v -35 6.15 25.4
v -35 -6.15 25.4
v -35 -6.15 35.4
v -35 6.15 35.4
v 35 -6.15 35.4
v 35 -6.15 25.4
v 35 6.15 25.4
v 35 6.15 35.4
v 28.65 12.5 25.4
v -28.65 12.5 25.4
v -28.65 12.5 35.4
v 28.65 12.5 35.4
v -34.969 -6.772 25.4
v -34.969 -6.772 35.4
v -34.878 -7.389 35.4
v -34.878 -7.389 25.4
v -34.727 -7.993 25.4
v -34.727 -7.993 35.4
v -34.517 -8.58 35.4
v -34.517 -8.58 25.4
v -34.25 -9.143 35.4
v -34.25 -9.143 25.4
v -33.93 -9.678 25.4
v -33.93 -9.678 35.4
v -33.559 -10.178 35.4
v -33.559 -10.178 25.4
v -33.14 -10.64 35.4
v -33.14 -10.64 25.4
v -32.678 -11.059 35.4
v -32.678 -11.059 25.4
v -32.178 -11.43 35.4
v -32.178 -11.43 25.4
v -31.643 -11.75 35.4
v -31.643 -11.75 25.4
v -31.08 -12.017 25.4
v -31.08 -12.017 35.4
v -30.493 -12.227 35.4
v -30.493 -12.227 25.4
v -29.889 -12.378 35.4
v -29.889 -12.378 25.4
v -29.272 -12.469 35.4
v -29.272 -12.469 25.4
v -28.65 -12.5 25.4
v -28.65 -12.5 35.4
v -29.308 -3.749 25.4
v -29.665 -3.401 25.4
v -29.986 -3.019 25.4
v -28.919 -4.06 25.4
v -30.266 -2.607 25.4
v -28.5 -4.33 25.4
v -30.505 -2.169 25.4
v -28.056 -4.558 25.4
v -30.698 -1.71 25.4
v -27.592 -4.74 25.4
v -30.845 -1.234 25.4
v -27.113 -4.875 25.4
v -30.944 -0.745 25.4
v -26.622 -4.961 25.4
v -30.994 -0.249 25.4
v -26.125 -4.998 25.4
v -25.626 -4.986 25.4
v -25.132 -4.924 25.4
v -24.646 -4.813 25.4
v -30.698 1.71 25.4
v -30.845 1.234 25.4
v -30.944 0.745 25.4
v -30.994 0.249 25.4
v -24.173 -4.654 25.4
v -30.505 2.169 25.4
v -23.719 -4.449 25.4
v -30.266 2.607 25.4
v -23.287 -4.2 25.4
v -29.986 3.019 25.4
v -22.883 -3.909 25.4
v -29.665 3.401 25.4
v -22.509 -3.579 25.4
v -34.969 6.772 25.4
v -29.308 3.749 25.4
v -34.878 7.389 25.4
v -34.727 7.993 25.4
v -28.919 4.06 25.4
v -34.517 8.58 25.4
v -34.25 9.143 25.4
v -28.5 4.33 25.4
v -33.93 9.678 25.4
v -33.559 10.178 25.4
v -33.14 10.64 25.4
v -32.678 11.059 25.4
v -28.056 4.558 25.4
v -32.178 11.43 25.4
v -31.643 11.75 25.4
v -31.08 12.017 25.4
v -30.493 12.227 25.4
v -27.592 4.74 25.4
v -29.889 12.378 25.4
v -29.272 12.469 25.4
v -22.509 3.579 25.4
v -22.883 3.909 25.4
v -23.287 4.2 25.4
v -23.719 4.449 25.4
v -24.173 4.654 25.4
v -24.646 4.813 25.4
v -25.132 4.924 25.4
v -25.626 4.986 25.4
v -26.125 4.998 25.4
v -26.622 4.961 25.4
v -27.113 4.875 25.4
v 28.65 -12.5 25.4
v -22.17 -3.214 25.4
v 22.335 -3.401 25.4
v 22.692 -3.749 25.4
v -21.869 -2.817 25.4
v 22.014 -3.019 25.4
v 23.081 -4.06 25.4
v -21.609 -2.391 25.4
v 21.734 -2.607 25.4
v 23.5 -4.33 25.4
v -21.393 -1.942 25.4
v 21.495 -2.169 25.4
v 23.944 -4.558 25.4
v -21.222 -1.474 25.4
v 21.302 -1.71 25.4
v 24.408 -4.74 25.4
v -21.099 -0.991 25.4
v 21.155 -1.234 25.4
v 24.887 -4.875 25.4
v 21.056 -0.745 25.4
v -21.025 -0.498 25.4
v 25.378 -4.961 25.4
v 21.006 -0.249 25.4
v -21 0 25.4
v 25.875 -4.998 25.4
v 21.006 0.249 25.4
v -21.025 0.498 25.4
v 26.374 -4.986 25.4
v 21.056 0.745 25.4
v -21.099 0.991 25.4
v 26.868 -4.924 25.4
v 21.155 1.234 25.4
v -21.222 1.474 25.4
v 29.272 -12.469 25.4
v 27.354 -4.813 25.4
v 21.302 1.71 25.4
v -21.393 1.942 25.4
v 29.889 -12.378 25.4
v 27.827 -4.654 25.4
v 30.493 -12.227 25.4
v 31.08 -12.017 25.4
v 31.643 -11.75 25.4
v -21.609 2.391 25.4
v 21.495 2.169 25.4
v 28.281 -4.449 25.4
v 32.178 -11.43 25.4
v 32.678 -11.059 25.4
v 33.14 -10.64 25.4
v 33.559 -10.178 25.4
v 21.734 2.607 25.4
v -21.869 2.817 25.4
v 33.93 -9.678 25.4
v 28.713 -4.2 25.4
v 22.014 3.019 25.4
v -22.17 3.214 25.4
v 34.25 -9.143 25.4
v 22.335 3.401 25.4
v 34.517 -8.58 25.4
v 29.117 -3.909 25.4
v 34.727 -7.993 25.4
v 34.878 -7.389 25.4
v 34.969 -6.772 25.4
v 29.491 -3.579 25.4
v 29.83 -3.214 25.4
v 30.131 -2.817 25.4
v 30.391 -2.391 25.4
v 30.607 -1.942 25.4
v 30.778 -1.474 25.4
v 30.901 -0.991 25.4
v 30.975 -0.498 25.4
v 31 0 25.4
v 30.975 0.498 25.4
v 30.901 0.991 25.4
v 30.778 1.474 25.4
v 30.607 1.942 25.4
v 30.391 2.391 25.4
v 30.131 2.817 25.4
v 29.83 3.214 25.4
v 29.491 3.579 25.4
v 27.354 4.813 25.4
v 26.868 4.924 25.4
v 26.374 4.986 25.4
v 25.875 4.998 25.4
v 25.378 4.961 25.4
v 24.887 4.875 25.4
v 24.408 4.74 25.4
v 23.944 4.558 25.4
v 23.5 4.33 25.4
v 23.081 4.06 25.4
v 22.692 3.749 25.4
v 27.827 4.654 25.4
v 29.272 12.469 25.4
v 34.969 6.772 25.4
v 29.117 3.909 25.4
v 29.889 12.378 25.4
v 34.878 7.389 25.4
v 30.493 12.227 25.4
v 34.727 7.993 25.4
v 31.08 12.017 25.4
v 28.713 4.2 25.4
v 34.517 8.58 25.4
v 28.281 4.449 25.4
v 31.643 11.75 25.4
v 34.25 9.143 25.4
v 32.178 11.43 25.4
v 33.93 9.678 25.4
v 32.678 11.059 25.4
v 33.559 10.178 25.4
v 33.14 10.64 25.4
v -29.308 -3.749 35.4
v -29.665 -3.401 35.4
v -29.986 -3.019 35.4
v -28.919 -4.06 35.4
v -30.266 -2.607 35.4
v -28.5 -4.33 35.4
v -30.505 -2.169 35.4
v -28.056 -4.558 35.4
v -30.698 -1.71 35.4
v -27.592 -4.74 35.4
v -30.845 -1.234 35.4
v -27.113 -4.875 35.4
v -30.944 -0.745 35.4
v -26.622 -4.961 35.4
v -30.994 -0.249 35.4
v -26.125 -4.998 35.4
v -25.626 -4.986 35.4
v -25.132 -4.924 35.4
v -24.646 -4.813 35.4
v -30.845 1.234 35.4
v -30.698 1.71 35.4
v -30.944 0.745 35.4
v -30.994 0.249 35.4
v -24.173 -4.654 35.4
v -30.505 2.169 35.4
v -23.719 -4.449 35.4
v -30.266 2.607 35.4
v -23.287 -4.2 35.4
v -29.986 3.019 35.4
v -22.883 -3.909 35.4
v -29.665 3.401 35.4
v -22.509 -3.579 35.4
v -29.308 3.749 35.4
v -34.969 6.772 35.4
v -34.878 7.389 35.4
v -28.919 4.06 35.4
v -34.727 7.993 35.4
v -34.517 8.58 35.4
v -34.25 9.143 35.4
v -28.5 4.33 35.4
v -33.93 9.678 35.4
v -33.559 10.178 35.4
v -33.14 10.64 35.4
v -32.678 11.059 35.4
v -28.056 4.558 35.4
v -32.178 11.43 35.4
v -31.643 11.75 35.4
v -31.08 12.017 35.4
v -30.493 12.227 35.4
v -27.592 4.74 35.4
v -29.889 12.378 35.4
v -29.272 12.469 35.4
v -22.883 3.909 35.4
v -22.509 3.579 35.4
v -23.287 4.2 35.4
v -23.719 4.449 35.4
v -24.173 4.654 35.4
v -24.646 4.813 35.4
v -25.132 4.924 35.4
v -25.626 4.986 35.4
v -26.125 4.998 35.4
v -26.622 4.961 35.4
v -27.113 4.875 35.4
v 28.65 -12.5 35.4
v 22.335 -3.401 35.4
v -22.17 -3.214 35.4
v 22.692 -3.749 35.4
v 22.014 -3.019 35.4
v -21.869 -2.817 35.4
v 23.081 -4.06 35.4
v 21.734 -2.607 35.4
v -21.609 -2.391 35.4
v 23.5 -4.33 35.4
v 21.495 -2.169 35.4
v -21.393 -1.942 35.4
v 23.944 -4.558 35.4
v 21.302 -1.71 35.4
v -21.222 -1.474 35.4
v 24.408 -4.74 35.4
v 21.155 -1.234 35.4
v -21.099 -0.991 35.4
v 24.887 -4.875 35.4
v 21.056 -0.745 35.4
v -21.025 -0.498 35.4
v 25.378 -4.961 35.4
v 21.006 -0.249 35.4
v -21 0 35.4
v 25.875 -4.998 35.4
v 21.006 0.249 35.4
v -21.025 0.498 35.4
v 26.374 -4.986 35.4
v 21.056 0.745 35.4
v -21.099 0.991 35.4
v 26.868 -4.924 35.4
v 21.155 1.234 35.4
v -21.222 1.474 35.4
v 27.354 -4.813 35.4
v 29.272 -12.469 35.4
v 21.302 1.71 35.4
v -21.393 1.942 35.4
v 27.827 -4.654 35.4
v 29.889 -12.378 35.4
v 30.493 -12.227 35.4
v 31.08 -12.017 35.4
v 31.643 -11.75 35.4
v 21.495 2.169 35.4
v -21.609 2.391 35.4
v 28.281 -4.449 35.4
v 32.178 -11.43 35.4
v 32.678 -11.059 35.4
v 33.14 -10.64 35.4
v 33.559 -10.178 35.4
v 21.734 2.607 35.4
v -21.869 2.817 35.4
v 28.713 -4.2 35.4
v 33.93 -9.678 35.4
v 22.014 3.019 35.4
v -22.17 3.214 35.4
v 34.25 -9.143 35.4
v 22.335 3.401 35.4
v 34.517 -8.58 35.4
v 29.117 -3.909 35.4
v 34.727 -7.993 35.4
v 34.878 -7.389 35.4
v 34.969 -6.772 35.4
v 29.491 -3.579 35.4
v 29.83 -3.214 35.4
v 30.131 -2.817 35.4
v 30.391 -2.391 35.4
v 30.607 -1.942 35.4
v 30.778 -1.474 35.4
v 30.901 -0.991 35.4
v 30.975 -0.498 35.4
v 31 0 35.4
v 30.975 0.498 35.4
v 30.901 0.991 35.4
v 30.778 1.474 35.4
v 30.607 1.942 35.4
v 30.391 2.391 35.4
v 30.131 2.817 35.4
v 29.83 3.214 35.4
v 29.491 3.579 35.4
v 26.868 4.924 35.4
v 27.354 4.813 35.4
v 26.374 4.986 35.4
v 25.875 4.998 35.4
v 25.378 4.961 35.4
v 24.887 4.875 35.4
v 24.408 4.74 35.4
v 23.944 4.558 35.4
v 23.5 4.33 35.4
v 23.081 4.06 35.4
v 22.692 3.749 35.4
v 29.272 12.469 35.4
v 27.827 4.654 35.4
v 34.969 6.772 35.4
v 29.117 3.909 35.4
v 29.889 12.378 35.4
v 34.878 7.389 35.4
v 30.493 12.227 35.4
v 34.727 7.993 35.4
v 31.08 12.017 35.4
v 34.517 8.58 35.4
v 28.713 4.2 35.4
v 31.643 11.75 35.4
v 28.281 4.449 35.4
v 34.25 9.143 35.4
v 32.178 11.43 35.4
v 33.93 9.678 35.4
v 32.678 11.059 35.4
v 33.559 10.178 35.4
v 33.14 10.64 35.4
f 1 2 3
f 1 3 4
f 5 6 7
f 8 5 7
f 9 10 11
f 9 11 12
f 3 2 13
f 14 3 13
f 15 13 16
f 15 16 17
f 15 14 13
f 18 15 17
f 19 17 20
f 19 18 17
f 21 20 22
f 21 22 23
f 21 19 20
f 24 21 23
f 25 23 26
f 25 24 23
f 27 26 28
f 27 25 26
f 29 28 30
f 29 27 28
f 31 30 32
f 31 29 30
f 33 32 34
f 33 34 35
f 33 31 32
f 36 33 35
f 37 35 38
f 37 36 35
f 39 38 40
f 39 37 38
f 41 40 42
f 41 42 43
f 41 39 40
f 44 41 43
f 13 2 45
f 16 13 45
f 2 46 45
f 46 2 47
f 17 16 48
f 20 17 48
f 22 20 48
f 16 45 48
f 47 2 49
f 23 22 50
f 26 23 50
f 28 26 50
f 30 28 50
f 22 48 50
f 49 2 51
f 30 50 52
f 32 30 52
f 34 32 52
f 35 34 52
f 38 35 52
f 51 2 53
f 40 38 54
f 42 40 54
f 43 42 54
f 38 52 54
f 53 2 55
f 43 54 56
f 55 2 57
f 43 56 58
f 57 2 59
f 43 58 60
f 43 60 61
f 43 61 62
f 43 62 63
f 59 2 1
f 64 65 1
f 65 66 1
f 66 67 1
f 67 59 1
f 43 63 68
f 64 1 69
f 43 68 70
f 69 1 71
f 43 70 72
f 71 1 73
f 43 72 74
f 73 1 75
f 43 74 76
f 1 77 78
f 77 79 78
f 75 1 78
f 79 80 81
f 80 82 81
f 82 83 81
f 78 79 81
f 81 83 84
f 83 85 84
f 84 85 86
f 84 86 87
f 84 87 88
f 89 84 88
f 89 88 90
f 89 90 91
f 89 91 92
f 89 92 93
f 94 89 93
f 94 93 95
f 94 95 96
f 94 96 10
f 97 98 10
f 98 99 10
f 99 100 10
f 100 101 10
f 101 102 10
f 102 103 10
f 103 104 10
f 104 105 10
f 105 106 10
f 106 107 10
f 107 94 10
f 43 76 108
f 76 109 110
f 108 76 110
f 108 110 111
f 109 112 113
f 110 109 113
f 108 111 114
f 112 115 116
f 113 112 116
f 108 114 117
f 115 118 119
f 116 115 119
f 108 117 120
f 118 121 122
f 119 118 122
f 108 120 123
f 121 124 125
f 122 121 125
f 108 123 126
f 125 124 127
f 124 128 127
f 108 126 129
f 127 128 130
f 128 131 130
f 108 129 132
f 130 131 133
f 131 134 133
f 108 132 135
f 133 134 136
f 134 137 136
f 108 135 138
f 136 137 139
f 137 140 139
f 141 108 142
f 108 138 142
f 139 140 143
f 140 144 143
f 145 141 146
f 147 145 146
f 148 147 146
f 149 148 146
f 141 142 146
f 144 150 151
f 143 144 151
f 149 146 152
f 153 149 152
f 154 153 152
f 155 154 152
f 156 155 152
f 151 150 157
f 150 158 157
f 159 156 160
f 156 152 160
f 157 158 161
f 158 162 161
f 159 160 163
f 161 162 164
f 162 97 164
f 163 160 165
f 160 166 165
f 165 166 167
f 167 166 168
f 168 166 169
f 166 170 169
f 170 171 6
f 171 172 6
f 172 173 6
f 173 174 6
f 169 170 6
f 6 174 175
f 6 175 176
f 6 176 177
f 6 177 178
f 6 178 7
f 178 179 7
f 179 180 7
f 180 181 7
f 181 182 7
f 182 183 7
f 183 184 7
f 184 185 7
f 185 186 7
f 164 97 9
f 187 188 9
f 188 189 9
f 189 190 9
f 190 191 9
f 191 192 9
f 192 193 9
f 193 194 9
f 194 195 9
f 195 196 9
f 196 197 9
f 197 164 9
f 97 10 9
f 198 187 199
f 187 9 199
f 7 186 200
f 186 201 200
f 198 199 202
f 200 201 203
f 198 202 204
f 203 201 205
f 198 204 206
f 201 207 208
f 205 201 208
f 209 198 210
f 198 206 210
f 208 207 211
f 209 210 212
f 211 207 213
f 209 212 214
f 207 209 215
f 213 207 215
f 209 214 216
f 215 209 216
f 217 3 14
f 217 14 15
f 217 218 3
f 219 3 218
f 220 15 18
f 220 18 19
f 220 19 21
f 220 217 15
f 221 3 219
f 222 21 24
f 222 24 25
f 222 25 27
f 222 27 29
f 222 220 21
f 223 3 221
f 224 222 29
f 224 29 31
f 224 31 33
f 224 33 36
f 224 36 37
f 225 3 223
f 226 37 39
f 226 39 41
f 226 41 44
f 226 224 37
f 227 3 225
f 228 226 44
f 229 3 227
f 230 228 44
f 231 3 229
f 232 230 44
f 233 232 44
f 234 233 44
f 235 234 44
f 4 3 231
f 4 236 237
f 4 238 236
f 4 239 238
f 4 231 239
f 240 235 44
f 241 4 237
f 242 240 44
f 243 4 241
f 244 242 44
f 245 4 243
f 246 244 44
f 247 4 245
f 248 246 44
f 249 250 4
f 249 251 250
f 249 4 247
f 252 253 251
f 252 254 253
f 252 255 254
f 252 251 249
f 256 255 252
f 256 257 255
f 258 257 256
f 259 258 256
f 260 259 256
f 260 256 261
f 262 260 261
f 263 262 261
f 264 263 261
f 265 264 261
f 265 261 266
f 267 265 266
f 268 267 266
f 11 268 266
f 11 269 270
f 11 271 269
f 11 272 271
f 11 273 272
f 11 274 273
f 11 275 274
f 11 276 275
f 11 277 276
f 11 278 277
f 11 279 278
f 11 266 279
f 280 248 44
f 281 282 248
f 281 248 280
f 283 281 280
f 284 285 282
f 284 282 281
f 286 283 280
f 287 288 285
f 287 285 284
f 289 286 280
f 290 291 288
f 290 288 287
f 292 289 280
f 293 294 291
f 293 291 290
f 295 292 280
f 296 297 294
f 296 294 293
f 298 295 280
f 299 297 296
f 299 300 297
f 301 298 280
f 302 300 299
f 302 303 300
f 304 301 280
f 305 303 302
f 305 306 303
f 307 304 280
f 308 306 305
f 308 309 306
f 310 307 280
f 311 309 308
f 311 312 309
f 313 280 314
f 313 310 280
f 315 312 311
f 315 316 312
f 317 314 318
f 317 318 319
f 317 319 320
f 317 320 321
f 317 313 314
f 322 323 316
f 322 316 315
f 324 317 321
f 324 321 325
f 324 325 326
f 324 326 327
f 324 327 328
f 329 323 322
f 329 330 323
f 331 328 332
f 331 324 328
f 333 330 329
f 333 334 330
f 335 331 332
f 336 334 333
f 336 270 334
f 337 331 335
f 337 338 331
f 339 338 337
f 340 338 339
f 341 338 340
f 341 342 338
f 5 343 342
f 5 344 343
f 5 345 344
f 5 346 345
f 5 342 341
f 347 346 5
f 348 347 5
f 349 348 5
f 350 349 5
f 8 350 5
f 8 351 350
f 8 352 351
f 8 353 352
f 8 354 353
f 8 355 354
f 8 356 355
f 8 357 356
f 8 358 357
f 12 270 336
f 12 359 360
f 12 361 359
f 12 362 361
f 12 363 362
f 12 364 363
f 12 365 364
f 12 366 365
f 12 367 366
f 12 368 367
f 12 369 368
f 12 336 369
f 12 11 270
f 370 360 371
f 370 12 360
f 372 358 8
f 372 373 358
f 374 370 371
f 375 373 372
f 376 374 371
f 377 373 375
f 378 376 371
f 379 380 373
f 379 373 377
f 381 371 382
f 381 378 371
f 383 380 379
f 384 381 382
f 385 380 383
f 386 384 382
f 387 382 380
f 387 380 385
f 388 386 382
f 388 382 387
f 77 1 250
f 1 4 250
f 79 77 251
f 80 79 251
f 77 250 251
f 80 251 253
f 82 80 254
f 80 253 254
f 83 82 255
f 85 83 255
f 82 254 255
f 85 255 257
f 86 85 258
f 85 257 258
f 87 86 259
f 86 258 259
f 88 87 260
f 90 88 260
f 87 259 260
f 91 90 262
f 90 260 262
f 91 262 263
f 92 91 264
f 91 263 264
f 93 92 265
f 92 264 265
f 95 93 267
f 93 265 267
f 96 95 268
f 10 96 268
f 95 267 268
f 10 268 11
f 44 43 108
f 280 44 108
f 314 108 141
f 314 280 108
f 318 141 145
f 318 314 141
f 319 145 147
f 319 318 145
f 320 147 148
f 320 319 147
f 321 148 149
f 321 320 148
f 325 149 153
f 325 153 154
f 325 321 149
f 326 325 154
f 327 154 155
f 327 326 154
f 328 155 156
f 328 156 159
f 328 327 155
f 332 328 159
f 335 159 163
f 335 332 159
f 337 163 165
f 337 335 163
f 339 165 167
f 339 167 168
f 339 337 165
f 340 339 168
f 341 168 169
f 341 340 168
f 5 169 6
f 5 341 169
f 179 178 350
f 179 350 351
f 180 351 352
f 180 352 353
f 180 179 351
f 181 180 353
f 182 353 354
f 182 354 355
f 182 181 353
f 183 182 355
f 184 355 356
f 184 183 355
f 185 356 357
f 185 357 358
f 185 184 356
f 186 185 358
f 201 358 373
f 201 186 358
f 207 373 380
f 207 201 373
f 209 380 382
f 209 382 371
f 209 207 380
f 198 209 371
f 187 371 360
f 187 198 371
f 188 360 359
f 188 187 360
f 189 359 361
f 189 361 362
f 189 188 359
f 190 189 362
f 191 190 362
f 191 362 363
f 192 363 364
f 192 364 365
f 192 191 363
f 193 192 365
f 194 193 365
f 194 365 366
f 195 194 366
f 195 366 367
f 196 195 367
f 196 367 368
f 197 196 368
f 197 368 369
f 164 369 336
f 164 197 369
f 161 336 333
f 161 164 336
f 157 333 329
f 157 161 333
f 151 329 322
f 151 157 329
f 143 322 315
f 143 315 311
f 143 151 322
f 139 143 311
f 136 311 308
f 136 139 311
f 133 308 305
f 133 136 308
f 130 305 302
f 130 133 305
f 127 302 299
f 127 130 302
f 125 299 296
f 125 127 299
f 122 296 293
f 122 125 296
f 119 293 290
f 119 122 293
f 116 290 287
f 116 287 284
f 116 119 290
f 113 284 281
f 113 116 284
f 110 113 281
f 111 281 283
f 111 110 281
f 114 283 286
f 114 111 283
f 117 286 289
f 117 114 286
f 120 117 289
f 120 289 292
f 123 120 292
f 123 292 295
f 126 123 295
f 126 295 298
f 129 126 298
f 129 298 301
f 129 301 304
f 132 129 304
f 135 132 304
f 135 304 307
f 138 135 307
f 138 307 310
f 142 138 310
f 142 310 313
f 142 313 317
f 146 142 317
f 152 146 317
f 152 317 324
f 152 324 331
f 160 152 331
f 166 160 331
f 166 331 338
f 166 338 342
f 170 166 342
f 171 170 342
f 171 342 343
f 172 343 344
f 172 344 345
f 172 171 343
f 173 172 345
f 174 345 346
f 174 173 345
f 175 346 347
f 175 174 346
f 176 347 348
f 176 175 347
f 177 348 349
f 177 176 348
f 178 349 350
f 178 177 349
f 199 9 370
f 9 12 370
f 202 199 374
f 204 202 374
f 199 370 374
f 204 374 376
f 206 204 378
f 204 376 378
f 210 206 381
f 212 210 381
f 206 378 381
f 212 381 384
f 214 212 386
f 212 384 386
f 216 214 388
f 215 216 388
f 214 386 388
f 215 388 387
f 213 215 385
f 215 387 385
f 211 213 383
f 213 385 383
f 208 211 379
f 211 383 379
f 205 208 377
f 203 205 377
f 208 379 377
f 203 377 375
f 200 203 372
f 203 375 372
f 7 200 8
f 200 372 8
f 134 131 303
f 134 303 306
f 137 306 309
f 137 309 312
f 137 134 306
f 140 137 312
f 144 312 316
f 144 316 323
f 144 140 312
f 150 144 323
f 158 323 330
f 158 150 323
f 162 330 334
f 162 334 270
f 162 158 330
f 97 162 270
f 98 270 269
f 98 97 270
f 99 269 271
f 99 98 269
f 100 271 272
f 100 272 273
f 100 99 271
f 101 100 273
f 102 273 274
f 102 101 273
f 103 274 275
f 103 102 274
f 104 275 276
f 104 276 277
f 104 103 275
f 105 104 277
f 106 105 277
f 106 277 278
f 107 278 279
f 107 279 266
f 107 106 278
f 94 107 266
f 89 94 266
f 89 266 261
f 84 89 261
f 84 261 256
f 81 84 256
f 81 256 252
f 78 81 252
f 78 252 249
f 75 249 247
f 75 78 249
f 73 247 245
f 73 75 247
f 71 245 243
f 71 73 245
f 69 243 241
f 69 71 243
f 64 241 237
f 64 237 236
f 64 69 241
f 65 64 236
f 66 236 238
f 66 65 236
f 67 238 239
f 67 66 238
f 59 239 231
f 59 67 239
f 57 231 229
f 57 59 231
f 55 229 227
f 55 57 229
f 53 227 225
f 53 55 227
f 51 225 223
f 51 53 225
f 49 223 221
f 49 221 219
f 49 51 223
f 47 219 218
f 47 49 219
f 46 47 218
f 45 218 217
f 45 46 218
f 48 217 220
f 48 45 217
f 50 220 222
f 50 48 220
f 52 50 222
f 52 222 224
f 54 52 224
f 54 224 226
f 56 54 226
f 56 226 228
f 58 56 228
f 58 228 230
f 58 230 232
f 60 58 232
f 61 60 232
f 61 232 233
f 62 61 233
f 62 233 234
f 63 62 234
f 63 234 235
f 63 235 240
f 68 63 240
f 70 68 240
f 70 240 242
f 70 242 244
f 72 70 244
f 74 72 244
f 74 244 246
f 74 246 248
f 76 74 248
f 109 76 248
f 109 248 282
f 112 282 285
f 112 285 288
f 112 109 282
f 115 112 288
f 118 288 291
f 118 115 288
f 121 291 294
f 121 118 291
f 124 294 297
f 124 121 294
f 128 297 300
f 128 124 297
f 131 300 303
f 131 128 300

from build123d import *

# Parameters (mm, degrees)
F1_W     = 70
F1_H     = 25
F1_R     = 5
F2_DEPTH = 10
F3_R     = 6.35


with BuildPart() as f2:
    # F1 (on offset) → F2 (new body)
    with BuildSketch(Plane.XY.offset(25.4)):
        Rectangle(F1_W, F1_H)
        with Locations((-26, 0)):
            Circle(F1_R, mode=Mode.SUBTRACT)
        with Locations((26, 0)):
            Circle(F1_R, mode=Mode.SUBTRACT)
    extrude(amount=F2_DEPTH)

    # F3
    f3_edges = [f2.edges().sort_by_distance(p)[0] for p in [
        (-35, 12.5, 30.4),
        (35, 12.5, 30.4),
        (35, -12.5, 30.4),
        (-35, -12.5, 30.4),
    ]]
    fillet(f3_edges, radius=F3_R)


solid = f2.part
